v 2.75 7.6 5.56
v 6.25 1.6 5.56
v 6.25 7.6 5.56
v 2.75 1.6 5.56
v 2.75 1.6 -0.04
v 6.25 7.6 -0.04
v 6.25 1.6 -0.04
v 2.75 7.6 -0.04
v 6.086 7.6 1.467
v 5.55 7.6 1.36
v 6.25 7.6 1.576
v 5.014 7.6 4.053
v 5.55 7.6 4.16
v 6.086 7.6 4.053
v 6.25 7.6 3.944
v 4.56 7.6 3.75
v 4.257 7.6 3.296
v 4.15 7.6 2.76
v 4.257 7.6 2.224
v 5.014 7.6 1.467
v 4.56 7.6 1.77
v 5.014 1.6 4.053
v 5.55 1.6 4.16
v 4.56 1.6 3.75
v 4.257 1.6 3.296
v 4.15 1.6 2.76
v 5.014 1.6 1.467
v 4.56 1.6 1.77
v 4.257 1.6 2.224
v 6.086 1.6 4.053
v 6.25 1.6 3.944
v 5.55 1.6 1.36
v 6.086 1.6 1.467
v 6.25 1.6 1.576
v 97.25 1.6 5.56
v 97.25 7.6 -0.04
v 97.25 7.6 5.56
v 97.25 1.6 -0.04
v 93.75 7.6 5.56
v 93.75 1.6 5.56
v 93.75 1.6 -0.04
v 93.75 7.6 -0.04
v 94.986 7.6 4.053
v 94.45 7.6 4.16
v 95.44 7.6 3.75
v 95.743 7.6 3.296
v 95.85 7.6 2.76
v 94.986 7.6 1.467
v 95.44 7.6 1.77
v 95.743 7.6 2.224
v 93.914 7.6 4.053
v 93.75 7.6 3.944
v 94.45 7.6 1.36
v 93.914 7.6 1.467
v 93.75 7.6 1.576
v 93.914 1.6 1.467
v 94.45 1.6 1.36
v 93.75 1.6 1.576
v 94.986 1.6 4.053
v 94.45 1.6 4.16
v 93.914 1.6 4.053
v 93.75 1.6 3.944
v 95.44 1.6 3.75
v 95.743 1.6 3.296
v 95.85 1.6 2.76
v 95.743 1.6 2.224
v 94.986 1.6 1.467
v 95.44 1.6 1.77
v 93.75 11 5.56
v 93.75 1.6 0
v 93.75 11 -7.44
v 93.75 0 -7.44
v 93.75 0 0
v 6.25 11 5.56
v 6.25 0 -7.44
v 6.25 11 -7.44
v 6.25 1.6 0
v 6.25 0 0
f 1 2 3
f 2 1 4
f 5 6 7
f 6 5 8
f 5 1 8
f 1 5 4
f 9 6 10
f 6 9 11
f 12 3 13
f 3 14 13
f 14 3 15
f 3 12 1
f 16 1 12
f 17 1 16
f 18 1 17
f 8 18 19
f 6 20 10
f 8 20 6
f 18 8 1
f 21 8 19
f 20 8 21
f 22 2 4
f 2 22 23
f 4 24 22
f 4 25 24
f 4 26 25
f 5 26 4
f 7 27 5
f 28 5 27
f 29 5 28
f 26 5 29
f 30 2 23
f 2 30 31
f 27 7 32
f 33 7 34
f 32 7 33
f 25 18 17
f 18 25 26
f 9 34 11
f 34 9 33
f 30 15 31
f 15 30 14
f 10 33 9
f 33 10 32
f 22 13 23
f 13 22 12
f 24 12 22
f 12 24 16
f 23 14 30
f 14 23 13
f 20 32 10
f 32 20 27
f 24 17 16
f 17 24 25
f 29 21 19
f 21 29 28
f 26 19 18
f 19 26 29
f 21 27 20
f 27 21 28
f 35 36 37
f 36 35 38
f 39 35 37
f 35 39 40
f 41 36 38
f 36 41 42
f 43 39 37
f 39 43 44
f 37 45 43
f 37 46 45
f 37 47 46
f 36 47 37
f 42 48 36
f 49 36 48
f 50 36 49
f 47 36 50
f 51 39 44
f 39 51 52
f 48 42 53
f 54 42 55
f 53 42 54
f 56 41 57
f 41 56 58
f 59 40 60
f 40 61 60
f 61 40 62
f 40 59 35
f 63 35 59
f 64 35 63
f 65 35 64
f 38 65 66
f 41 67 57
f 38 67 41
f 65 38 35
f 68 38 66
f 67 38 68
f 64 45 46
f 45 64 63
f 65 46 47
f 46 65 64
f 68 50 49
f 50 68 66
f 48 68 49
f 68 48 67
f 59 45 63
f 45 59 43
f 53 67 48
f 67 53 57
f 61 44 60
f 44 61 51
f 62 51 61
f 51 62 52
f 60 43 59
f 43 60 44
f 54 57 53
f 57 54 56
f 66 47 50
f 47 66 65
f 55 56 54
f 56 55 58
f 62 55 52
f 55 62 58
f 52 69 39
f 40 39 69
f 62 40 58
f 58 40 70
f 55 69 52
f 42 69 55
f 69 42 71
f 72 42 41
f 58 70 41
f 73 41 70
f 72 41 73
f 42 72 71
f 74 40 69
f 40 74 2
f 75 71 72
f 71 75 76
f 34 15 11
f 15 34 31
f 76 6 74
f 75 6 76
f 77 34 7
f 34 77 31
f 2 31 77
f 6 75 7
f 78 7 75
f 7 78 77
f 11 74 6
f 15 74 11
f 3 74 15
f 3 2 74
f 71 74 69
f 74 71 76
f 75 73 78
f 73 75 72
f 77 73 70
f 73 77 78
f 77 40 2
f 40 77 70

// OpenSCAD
// file: ../library/linurs_screw.scad
// Metric screws and nuts 
// urs@linurs.org 2015
// It is targeted for 3D printing applications. 
// To look realistic is not the goal (Example: Nuts do not have a hole)

include <linurs_screw_dim.scad>

// Changes
//2019-02-09 split in two files
//2017-05-19 bug fix hexbolt had wrong diameter
//2017-01-22 bug fix lentgh of hex scre is outer lenght as other screw types
//2017-01-06 added hex screw
//2015-10-12 added screw_cut
//2015-11-29 screw_fix parameter sunk added, and module hex_bolt

// Consistent parameters in this file
// d screw diameter M2_5, M3, ... (enumeration with screw_d)
// t millimeters added to diameters 
//   For the screw, head, nut = 0. 
//   For the piece where the screw, nut, ... passes through = 0.5 so it slides in well

// functions used multiple times to position nuts and heads
function headh_cyl(d)=screw_cyl[d][1];  // height of cyl screw head
function headh_cnt(d)=screw_cyl[d][1];  // height of cnt screw head
function headh(d,type=head_cyl)=(type==head_cyl ? headh_cyl(d) : (type==head_cnt ? headh_cnt(d) : 0 )); // height of screw head 

function nuth(d)=screw_hex[d][2];   // height of hex nut

// head of a cylinder screw
module screw_head_cyl(d=M3, t=0)
{
  screwhd=screw_cyl[d][0]+t; // diameter of cylinder screw head
  cylinder(d=screwhd,h=headh(d=d, type=head_cyl), center=true,$fn=16); // screw head
}

// head of a countersunk screw
module screw_head_cnt(d=M3, t=0)
{
  screwd=screw_d[d]+t; 
  screwhd=screw_cnt[d][0]+t; // diameter of cylinder screw head
  cylinder(d1=screwd,d2=screwhd,h=headh(d=d,type=head_cnt), center=true,$fn=16); // screw head
}

// head of a hex screw
module screw_head_hex(d=M3, t=0)
{
    translate([0,0,-nuth(d)/2])nut(d=d, t=t);
}

// head of all screws
module screw_head(d=M3, type=head_cyl, t=0)
{ 
  if(type==head_cnt){
    screw_head_cnt(d=d, t=t);
  } else {
    if(type==head_cyl){
      screw_head_cyl(d=d, t=t);
    } else {
       if(type==head_hex){
           screw_head_hex(d=d, t=t); 
       } 
    }    
  }
}

// hex bolt 
module hex_bolt(d=M3, h=10, t=0)
{
  nutd=screw_hex[d][1]+t; // outer diameter of hex bolt
  cylinder(r=nutd/2,h=h+t, center=true,$fn=6); // nut
}

// nut 
module nut(d=M3, t=0)
{
  hex_bolt(d=d, h=nuth(d), t=t);    
}

// screw 
// w outer width of the screw = screw length + head 
module screw(w=10, d=M3, type=head_cyl, t=0){
  screwd=screw_d[d]+t;       // screw diameter
  cylinder(d=screwd, h=w, center=true,$fn=16); // screw thread length
  translate([0,0,w/2-headh(d=d,type=type)/2])
  screw_head(d=d,type=type, t=t);
}

// screw fix
// w outer width of the screw = screw length + head 
// sink additional material below to remove 
// raise additional material above to remove
module screw_fix(w=10, d=M3, type=head_cyl, sink=0, raise=0, t=0){
  screw(w=w-sink*2, d=d, type=type, t=t);
  translate([0,0,-(w-sink*2)/2+nuth(d)/2])
    nut(d=d,t=t);
  translate([0,0,-(w-sink+raise)/2])hex_bolt(d=d,h=sink+raise,t=t);    
  if(type==head_cnt){  
    translate([0,0,(w-sink+raise)/2])
    cylinder(d=screw_cnt[d][0]+t,h=sink+raise,center=true,$fn=16);
  }else{ 
    translate([0,0,(w-sink+raise)/2])
    cylinder(d=screw_cyl[d][0]+t,h=sink+raise,center=true,$fn=16);
  }     
}
//screw_fix();
//translate([10,0,0])screw_fix(sink=2,type=head_cnt);
//translate([-10,0,0])screw_fix(raise=2,type=head_cnt);

// screw cut
// material to be extracted from object to slide in a counter sunk screw for fixation
// w height of the cut out
// i depth of the screw
module screw_cut(d=M3,w=20,i=10,t=0,fn=32){
    hsh=screw_cnt[d][1];
    ws=screw_cnt[d][0]+t;
    ds=screw_d[d]+t;
    
    translate([i/2,0,-(w-hsh)/2])
      cube([i,ws,hsh],center=true);
    
    translate([0,0,-(w-hsh)/2])
      cylinder(d=ws,h=hsh,center=true,$fn=32);
    
    translate([0,0,-(w-hsh)/2+hsh])
        cylinder(d2=ds, d1=ws, h=hsh,center=true,$fn=fn);
    
    cylinder(h=w, d=ds, center=true, $fn=fn);   
    
    translate([i/2,0,0]) 
        cube([i,ds,w],center=true);
    
    for(y=[-1,1]){
        translate([i/2,y*ds/2,-w/2+hsh])
            rotate([45,0,0])
            cube([i,sqrt(2)*(ws-ds)/2,sqrt(2)*(ws-ds)/2],center=true);
    }
}
//screw_cut();

// nut cut
// material to be extracted from object to slide in a nut for fixation
// w height of the cylinder
// i lenght of the inlet
module nut_cut(w=10, wi=0, d=M3, i=10, t=0, raise=0, type=head_cyl){ 
  nut(d,t);
  translate([i/2,0,0])
    cube([i,screw_hex[d][0]+t,nuth(d)+t],center=true);
  translate([0,0,-wi])
      if(type==head_cnt){    
          screw(w=w, d=d, type=type, t=t); 
        translate([0,0,(w+raise)/2-0.01])
          cylinder(d=screw_cnt[d][0]+t,h=raise,center=true,$fn=16);
      }else{ 
          screw(w=w, d=d, type=type, t=t);   
        translate([0,0,(w+raise)/2-0.01])
          cylinder(d=screw_cyl[d][0]+t,h=raise,center=true,$fn=16);
      }       
}
//
nut_cut(raise=2,type=head_cnt,i=14,w=20,wi=2, t=1);

// present the library
show=0;

if(show==1){
    grid=20;
    
    for (j=[0:10]){
        for (i=[0:3])
           translate([j*grid,i*grid,0]){  
           
    // elements           
           if(j==0){
             screw_fix(w=(i+2)*5,d=i, type=head_cyl, t=0);
           }
       
           if(j==1){
             nut(d=i,t=0);
           } 
       
           if(j==2){   
              screw(d=i,t=0);
           } 
           
           if(j==3){   
              screw(d=i,t=0,type=head_cnt);
           } 
           
           if(j==4){   
              screw(d=i,t=0,type=head_hex);
           } 
           
           if(j==5){   
              hex_bolt(d=i,t=0);
           } 
           
       }
    }   
     
    for (j=[0:2]){
        for (i=[0:3])
           translate([j*grid,-(i+1)*grid,0]){  
             difference(){
                cube([3*screw_d[i],3*screw_d[i],(i+2)*5-0.1],center=true);    
    
                if(j==0){
                  screw_fix(w=(i+2)*5,d=i,type=head_cnt, t=0.5);
                }   
                
                if(j==1){
                  nut_cut(d=i,w=(i+2)*5);
                }
                if(j==2){
                  screw_cut(d=1,w=(i+2)*5);
                }
            
             }
           }  
        
    }
}
   
// file: ../library/linurs_screw_dim.scad
// Metric screws and nuts 
// urs@linurs.org 2015

// contains dimensions of linurs_screw and can be included in other 
// OpenScad files 


// Consistent parameters in this file
// d screw diameter M2_5, M3, ... (enumeration with screw_d)
// t millimeters added to diameters 
//   For the screw, head, nut = 0. 
//   For the piece where the screw, nut, ... passes through = 0.5 so it slides in well

// enumerations of metric threads
M2_5=0;
M3=1;
M4=2;
M5=3;

// enumerations screw head type
head_cyl=0; // cylinder
head_cnt=1; // countrsunk
head_no=2;  // no head at all
head_hex=3;  // no head at all

// screw diameters
screw_d=[
2.5, // M2.5
3.0, // M3
4.0, // M4
5.0  // M5
];

// sizes for hex nuts
screw_hex=[
//   s,   e,   h
 [ 5.0, 5.8, 1.7], // M2.5
 [ 5.5, 6.4, 2.0], // M3
 [ 7.0, 8.1, 2.8], // M4
 [ 8.0, 9.2, 3.5]  // M5
];

// sizes for cylinder screw heads
screw_cyl=[
//   d,   h
 [ 4.5, 1.6], // M2.5
 [ 5.5, 2.0], // M3
 [ 7.0, 2.6], // M4
 [ 8.5, 3.3]  // M5
];

// sizes for countersunk screw heads
screw_cnt=[
//   d,   h
 [ 4.7, 1.50], // M2.5
 [ 5.6, 1.65], // M3
 [ 7.4, 2.20], // M4
 [ 9.2, 2.50]  // M5
];
// file: pcbmodule_dim.scad
include <../library/linurs_screw_dim.scad>
include <../motherboard/motherboard_dim.scad>
// pcb constants
pcb_h=80;              // height of the pcb
pcb_thick=1.6;         // thickness
pcb_x1=3;              // position mounting holes
pcb_x2=97;
pcb_y1=9;
pcb_y2=76;
pcb_d=3;               // diameter of holes

// bracket constants
bracket_t=2;           // thickness of bracket
bracket_x1=10;         // depth of the U shape at the side of the screw
bracket_x2=4;          // depth of the U shape at the side where no screw is  
bracket_h=pcb_h+15;    // height of bracket
bracket_hole_cube_h=4; // height of the mounting hole cube
bracket_screw=M2_5;    // hole for the screw

// bracket offsets
bracket_offset_x=-3;   // bracket offset in elecbox x axis (adding gap)
bracket_offset_z=-10;  // bracket offset in elecbox z axis

// pcb module dimensions
pcbmodule_w=(-bracket_offset_x)*2+motherboard_w; // depth of the module
pcbmodule_h=bracket_h;                           // hight of the module   
pcbmodule_l=step;                                // width of the module   

screw_t=1; //mm added so screws fit into holes
olp=0.1; // overlapp distance to produce nice body after difference() 
// file: connector.scad
// connector
// Connector to be mounted on pcb of the modules
// This module is not intended to be 3D printed
include <pcbmodule_dim.scad>
include <../motherboard/motherboard_dim.scad>

use <pcb.scad>

con_w=87.5;   // width of connector bodywithout flanges of mounting holes 
con_d=2.8;    // diameter of mounting holes
con_d_w=88.9; // distance between mounting holes
con_m_h=6;    // height of mounting cube
con_h=13;     // largest z dimension

module connector(){
  echo("pcb connector");
  color("LightGrey")
  difference(){
    translate([(motherboard_w-con_w)/2,0,-pcbmodule_con_out]) // bring in position of elecbox
    union(){
      cube([con_w,motherboard_con_t,con_h]); // main body of the connector
      for(x=[(con_w-con_d_w)/2,con_w+(con_d_w-con_w)/2]){ // add the two brackets
        translate([x,con_m_h/2+pcb_thick,10.2])
        difference(){
          cube([2*con_d,con_m_h,2*con_d],center=true);  // bracket main body
          rotate([90,0,0])
          cylinder(d=con_d, h=con_h, $fn=16, center=true); // hole in brackets
        }
      }
    }
    translate([0,-olp,0])cube([motherboard_w,motherboard_t+olp,2*con_d]); // remove material to create edge of pcb
  }
}
connector();

//
pcb();
// file: pcb.scad
// pcb
// pcb of the module
// This module is not intended to be 3D printed

include <../motherboard/motherboard_dim.scad>
include <pcbmodule_dim.scad>


module pcb(){
  echo("pcb");  
  color("greenyellow")
  difference(){
    cube([motherboard_w,pcb_thick,pcb_h]); // pcb
    for(x=[pcb_x1,pcb_x2]){ // mounting holes
      for(y=[pcb_y1,pcb_y2]){
        translate([x,0,y])
        rotate([90,0,0])
        cylinder(d=pcb_d,h=3*pcb_thick,center=true,$fn=16);
      }
    }
  }
}

//
pcb();
// file: bracket.scad
// bracket
// A bracket of the elecbox module
// - type: 0 front bracket, 1 rear bracket
// - width 1..n in steps
// - var: 0 do not create intermediate mounting holes, 1 create intermediate mounting holes 

include <pcbmodule_dim.scad>
include <../motherboard/motherboard_dim.scad>
include <../library/linurs_screw_dim.scad>

use <../library/linurs_screw.scad>


module bracket(type=0, width=1, var=0){
  echo("bracket");  
  color("White")
  translate([type*motherboard_w,
             0,
             0])  // move mirrored bracket in position if desired
  mirror([type*1,0,0])       // mirror it if desired
  difference(){
    union(){
      for(x=[1:width]){  // create the mounting hole cubes 
        for(z=[pcb_y1,pcb_y2]){
          translate([pcb_x1,
                     (x-1)*step*var-bracket_hole_cube_h/2,
                     z])
          cube([bracket_x1-bracket_t,bracket_hole_cube_h,3*screw_d[bracket_screw]],center=true);
        }
      }

      translate([bracket_t/2+bracket_offset_x,
                 step/2*width-bracket_hole_cube_h,
                 bracket_h/2+bracket_offset_z])  
      cube([bracket_t,step*width,bracket_h],center=true);  // create the bracket front


      translate([bracket_x1/2+bracket_offset_x,
                 bracket_t/2-bracket_hole_cube_h,
                 bracket_h/2+bracket_offset_z]) 
      cube([bracket_x1,bracket_t,bracket_h],center=true);  // create the bracket mounting


      translate([bracket_x2/2+bracket_offset_x,
                 bracket_t/2-bracket_hole_cube_h+step*width-bracket_t,
                 bracket_h/2+bracket_offset_z]) 
      cube([bracket_x2,bracket_t,bracket_h],center=true);  // create the bracket mounting


    }
    for(x=[1:width]){ // create the mounting hole 
      for(z=[pcb_y1,pcb_y2]){
        translate([pcb_x1,
                   (x-1)*step*var-olp,
                   z])
        rotate([0,90,0])
        rotate([-90,0,0])
        screw_fix(w=2*bracket_hole_cube_h,d=bracket_screw,type=head_no, t=screw_t);
      }
    }
  }
}

// to show
//bracket(type=1, width=2, var=1);
//
bracket();
bracket(type=1);
//

// to print
//rotate([0,-90,0])bracket(type=0);
//rotate([0,90,0]) bracket(type=1);
//bracket(type=0);

module arduino(){
    difference(){
        bracket(type=0);
        translate([0,1+12/2,52.5+13/2])cube([20,12,13],center=true);
        translate([0,1+12/2,24+10/2])cube([20,12,10],center=true);
        translate([0,1+12+2/2,21.5+54/2])cube([20,2,54],center=true);
    }
}
//rotate([0,-90,0])
//arduino();

module 3DprinterIOfront(){
    difference(){
        bracket(type=0);
        translate([0,11/2,37.5+34/2])cube([20,11,34],center=true);        
    }
}
//rotate([0,-90,0])
//3DprinterIOfront();

module 3DprinterIOback(){
    difference(){
        translate([-100,0,0])bracket(type=1);
        translate([0,14/2,12+31/2])cube([20,14,31],center=true); 
        translate([0,14/2,53.5+18.5/2])cube([20,14,18.5],center=true);               
    }
}
//rotate([0,90,0])
//3DprinterIOback();

module Fetback(){
    difference(){
        translate([-100,0,0])bracket(type=1);
        translate([0,14/2,15+51/2])cube([20,14,51],center=true); 
       
    }
}
//rotate([0,90,0])
//Fetback();

module Stepperback(){
    difference(){
        translate([-100,0,0])bracket(type=1);
        translate([0,14/2,15+14/2])cube([20,14,14],center=true); 
        translate([0,14/2,30+14/2])cube([20,14,14],center=true); 
        translate([0,14/2,45+14/2])cube([20,14,14],center=true); 
        translate([0,14/2,60+14/2])cube([20,14,8],center=true); 
            
    }
}
//rotate([0,90,0])
//Stepperback();

module Stepperfront(){
    difference(){
        bracket(type=0);
        translate([0,14/2,15+14/2])cube([20,14,14],center=true); 
        translate([0,14/2,30+14/2])cube([20,14,14],center=true);    
       translate([0,14/2,60+14/2])cube([20,14,8],center=true);      
    }
}
//rotate([0,-90,0])
//Stepperfront();

module I2Cback(){
    difference(){
        translate([-100,0,0])bracket(type=1);
        translate([0,12/2,31+13/2])cube([20,12,13],center=true);       
    }
}
//rotate([0,90,0])
//I2Cback();

module I2Cfront(){
    difference(){
        bracket(type=0);
        translate([0,13/2,21+25/2])cube([20,13,25],center=true); 
        translate([0,5,49])rotate([0,90,0])cylinder(h=20,d=5.5,center=true, $fn=16);    
        translate([0,5,57])rotate([0,90,0])cylinder(h=20,d=5.5,center=true, $fn=16);      
    }
}
//rotate([0,-90,0])
//I2Cfront();

module MCP2221back(){
    h=12;
    w=13;
    z=31;
    difference(){
        translate([-100,0,0])bracket(type=1);
        translate([0,h/2+pcb_thick,z+w/2])cube([20,h,w],center=true);       
    }
}
//rotate([0,90,0])
//MCP2221back();

module MCP2221front(){
    h1=12;
    w1=12;
    z1=29;
    d2=4;
    h2=3;
    z2=66;
    difference(){
        bracket(type=0);
        translate([0,h1/2+pcb_thick,z1+w1/2])cube([20,h1,w1],center=true); 
        translate([0,h2+pcb_thick,z2])rotate([0,90,0])cylinder(h=20,d=d2,center=true, $fn=16);          
    }
}
//rotate([0,-90,0])
//MCP2221front();
// file: ../motherboard/motherboard_dim.scad
// motherboard pcb dimensions
motherboard_w=100;   // pcb width
motherboard_t=1.6;   // pcb thickness
motherboard_pass=0.5;// gap to fit screws 
step=25.4;           // distance between modules

// connector dimensions
motherboard_con_head_w=85;  // width of the connector head
motherboard_con_head_d=8.5; // depth of the connector head
motherboard_con_w=95;       // largest width of the connector
motherboard_con_h=11.6;     // largest height of the connector
motherboard_con_t=11;       // largest depth of the connector
motherboard_con_d_w=90;     // distance between mounting holes
motherboard_con_d=2.8;      // diameter of mounting holes
motherboard_con_out=5.2;    // height produced by the connector when pulgged in 

// pcb module connector dimension
pcbmodule_con_out=13-(5.3+2.8-2.54);  // distance connector sticks out of pcb

// offset
motherboard_z_offset= -(pcbmodule_con_out+motherboard_con_out+motherboard_t); // z offset motherboard built in
// main file
// module (pcb assembly)
// A series of assembled modules
// This module is not intended to be 3D printed
include <../motherboard/motherboard_dim.scad>

use <bracket.scad>
use <pcb.scad>
use <connector.scad>

module pcbmodule(n=1){
  for(i=[1:n]){
    translate([0,(i-1)*step,0]){
      pcb();
      connector();
      bracket();
      bracket(type=1);
    }
  }
}


//pcbmodule(n=1);
connector();
